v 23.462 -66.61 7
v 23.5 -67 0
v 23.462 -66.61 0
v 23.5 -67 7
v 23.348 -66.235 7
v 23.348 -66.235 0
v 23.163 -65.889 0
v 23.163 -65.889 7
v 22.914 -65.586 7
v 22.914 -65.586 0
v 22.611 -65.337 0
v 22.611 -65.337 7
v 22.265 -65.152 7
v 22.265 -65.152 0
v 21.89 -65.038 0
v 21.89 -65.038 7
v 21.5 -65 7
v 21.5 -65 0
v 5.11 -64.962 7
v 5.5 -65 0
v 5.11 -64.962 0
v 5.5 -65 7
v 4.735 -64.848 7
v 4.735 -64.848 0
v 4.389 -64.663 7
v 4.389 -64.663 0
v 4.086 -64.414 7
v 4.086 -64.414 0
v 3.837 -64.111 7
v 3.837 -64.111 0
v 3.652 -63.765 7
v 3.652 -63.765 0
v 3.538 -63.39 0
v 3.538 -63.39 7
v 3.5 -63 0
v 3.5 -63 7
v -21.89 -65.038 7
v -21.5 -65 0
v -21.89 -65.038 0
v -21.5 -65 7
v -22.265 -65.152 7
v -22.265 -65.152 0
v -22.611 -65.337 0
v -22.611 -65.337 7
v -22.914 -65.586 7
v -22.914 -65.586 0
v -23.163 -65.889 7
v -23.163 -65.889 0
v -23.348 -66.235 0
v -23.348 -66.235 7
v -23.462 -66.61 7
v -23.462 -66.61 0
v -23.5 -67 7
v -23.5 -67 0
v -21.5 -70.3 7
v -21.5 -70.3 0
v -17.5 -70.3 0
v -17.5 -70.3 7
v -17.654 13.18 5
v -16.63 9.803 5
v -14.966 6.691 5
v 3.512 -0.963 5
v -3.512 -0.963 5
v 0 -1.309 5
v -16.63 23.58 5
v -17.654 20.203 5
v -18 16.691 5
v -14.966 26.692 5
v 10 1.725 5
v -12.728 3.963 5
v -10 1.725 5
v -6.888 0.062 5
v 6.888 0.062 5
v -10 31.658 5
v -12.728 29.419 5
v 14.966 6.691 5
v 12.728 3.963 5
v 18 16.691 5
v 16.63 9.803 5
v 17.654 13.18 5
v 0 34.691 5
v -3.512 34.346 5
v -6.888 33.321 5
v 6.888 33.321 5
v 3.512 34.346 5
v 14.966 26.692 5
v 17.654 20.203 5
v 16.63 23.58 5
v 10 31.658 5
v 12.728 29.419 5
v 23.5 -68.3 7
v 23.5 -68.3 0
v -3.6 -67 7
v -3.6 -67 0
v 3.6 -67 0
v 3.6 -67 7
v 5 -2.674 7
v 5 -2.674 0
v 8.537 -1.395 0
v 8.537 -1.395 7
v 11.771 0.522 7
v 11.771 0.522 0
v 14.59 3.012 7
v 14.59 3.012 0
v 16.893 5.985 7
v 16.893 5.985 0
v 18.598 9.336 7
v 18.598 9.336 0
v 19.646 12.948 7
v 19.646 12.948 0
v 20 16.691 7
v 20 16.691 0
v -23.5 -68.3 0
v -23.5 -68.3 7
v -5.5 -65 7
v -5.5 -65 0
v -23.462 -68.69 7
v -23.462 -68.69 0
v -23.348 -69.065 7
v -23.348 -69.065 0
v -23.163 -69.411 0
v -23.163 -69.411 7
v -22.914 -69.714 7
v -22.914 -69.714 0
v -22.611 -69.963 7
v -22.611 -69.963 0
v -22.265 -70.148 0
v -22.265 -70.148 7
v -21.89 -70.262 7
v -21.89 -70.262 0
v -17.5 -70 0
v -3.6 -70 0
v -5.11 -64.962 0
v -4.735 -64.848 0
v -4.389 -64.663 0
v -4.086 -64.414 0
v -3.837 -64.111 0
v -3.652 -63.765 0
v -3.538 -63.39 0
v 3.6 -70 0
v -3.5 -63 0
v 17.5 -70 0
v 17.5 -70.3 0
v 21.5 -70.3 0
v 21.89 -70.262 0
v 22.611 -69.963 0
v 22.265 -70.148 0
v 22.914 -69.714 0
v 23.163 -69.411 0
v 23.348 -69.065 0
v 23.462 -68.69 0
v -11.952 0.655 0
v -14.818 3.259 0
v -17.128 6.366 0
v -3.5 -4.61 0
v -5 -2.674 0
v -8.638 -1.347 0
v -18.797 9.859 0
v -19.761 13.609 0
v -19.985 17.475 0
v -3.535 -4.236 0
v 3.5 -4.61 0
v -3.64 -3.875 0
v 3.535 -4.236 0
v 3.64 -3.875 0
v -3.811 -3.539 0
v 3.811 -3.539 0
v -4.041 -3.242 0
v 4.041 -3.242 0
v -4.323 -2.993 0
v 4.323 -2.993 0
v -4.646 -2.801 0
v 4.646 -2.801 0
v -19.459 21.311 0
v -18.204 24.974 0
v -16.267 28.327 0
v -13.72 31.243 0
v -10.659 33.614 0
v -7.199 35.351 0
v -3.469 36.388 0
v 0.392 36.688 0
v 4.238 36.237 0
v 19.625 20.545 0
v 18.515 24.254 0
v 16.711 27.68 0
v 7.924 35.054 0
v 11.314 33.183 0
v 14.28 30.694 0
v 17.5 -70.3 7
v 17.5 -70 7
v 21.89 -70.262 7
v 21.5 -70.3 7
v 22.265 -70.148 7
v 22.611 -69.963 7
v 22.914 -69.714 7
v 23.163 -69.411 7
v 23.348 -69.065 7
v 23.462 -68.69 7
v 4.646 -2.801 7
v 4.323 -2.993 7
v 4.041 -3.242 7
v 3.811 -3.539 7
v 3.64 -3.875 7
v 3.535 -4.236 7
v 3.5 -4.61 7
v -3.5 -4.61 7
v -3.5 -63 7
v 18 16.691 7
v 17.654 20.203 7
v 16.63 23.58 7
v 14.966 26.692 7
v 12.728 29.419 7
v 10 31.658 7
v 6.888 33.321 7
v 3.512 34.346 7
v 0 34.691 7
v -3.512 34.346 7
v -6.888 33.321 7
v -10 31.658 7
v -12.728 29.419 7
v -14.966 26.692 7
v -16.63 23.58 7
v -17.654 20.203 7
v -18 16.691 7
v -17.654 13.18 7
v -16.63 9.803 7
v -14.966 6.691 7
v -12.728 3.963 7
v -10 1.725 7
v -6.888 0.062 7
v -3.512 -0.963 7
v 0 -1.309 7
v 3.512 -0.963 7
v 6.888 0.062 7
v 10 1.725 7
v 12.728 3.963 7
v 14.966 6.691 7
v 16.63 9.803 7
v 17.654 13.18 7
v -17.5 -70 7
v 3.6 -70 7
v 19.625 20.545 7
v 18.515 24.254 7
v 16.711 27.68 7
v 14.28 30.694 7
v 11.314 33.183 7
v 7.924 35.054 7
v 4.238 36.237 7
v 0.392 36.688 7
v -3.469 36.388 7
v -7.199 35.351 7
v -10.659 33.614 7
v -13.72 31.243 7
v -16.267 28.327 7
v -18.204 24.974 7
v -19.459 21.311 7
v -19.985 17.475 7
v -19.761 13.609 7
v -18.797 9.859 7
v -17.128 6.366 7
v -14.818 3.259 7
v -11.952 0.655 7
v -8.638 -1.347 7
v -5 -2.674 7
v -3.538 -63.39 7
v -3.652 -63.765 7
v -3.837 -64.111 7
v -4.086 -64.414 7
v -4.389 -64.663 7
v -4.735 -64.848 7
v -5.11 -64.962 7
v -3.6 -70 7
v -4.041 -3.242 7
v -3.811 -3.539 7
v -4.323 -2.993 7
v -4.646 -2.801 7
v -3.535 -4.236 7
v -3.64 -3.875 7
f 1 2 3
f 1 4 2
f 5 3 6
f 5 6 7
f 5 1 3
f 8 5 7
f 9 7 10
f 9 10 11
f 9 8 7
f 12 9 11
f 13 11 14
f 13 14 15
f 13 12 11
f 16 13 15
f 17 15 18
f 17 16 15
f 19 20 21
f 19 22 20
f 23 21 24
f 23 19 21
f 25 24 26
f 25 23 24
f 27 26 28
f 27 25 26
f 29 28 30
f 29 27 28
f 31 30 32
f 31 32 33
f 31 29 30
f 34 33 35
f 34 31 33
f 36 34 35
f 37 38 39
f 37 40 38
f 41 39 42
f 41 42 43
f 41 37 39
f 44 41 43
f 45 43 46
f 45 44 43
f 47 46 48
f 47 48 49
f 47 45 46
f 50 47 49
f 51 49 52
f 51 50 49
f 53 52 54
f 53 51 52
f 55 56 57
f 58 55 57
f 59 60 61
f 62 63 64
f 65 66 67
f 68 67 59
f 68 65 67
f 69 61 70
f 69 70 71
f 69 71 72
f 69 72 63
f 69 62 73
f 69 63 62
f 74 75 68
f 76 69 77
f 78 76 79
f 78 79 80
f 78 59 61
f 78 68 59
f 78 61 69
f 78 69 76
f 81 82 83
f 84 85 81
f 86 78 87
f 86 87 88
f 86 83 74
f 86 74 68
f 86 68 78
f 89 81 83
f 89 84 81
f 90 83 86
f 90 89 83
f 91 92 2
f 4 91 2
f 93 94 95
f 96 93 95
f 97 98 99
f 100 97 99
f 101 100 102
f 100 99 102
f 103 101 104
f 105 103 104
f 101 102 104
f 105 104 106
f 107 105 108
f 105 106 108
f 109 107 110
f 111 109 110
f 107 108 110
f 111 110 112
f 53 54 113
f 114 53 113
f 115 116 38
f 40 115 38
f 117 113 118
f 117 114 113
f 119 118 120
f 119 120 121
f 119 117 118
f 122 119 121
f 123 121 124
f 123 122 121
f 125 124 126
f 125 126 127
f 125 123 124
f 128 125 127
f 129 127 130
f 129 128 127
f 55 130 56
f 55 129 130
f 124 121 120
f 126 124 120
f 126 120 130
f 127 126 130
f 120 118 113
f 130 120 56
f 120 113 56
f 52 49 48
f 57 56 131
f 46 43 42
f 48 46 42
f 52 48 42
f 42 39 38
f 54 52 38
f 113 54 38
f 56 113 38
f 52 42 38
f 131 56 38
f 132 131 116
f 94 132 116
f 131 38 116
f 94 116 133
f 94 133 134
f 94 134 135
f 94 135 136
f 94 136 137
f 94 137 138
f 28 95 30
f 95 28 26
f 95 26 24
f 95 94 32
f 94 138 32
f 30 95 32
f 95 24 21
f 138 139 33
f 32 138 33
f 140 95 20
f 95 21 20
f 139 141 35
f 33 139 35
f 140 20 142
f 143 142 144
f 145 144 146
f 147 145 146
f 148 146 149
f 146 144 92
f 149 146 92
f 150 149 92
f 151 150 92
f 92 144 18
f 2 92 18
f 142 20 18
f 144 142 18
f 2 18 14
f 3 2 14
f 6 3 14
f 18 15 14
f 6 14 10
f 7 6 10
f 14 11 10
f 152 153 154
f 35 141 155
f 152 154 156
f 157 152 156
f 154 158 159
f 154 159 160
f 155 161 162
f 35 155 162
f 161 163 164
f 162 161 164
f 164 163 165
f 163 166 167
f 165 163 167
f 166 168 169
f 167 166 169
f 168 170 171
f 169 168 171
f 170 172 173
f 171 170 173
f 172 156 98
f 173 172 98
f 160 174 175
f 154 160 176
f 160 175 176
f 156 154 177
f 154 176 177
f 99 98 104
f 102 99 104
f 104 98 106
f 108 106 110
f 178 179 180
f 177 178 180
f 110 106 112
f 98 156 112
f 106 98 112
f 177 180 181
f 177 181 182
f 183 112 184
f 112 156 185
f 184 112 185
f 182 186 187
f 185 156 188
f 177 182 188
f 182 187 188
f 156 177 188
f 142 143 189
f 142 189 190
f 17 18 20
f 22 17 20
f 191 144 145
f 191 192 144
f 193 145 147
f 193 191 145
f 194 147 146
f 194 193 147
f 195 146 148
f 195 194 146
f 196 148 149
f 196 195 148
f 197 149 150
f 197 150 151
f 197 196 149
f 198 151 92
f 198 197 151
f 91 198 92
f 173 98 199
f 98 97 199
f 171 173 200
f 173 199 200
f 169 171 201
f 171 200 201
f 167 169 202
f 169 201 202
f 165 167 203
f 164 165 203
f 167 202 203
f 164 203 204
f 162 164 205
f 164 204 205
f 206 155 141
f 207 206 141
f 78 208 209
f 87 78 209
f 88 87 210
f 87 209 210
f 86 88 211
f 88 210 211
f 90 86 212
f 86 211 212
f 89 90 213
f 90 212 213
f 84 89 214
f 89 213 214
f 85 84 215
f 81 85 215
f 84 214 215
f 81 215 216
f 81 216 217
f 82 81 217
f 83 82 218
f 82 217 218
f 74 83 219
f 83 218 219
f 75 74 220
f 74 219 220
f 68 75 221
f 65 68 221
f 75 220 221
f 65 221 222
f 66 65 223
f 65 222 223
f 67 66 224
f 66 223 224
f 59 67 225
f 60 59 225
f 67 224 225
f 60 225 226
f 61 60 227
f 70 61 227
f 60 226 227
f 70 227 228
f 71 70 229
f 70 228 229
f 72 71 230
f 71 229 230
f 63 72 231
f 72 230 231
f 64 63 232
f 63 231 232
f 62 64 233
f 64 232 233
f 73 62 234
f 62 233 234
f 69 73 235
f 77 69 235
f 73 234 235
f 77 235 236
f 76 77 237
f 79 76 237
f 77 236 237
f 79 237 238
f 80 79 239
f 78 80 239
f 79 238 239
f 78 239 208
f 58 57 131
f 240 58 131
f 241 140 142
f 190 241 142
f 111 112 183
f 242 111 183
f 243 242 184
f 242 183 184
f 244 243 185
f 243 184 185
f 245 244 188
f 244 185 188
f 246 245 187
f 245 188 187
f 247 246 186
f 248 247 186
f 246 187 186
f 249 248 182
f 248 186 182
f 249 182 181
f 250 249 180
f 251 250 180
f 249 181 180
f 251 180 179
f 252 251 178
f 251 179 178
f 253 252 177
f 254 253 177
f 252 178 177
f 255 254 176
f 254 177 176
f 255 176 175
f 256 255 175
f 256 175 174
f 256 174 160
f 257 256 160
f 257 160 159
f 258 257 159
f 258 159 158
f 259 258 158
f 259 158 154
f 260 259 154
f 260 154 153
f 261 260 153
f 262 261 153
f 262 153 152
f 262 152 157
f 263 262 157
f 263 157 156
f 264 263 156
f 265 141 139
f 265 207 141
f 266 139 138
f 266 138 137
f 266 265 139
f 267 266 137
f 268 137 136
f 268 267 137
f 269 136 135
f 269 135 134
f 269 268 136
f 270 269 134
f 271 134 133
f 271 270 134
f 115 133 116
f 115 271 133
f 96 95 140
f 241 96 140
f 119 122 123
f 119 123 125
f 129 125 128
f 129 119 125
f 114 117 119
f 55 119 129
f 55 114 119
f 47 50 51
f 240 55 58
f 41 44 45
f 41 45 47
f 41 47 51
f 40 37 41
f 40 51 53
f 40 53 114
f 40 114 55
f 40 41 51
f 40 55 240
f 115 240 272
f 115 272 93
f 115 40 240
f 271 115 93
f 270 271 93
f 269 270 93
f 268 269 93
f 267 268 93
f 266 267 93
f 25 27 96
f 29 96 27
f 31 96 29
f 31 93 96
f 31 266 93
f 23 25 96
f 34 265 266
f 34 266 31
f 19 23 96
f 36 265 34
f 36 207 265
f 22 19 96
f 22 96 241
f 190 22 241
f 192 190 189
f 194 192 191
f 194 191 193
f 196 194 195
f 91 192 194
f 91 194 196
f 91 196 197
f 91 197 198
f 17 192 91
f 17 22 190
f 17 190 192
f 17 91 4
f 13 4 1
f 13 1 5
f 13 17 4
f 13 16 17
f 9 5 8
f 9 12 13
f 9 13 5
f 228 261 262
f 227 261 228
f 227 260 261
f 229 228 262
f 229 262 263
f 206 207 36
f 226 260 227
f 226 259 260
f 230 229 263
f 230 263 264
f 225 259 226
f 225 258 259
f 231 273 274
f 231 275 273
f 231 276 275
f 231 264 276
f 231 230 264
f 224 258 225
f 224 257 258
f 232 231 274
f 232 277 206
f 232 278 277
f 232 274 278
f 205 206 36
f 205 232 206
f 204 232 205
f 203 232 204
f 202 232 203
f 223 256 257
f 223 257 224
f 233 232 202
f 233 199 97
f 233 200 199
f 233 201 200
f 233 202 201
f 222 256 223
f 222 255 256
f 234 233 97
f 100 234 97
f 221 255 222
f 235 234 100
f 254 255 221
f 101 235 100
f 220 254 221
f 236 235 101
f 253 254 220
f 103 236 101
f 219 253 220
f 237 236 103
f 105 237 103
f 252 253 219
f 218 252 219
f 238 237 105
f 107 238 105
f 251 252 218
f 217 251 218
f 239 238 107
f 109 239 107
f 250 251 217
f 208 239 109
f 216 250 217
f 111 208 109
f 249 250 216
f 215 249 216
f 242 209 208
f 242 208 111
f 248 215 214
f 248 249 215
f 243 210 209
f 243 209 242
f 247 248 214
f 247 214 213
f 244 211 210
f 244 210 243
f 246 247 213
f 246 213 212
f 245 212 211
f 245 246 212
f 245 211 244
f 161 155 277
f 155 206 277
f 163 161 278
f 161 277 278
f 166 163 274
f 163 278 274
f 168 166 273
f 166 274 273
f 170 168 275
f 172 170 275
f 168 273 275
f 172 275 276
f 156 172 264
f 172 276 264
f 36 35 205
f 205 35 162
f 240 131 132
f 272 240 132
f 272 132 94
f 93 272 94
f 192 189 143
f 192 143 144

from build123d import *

# Parameters (mm, degrees)
F0_W     = 6
F0_H     = 0.3
F1_DEPTH = 7
F2_R     = 18
F3_DEPTH = 2
F4_R     = 2


# Not quite as in the source:
# - a feature names something its author has since deleted; it is built from what else it names


with BuildPart() as f1:
    # F0 (on Top) → F1 (new body)
    with BuildSketch(Plane.XY):
        with BuildLine():
            ThreePointArc((3.5, -3), (0, -3.3086313325), (-3.5, -3))
            Line((-3.5, -3), (-3.5, -65))
            Line((-3.5, -65), (-23.5, -65))
            Line((-23.5, -65), (-23.5, -70))
            Line((-23.5, -70), (-17.5, -70))
            Line((-17.5, -70), (-3.6, -70))
            Line((-3.6, -70), (-3.6, -67))
            Line((-3.6, -67), (3.6, -67))
            Line((3.6, -67), (3.6, -70))
            Line((3.6, -70), (17.5, -70))
            Line((17.5, -70), (23.5, -70))
            Line((23.5, -70), (23.5, -65))
            Line((23.5, -65), (3.5, -65))
            Line((3.5, -65), (3.5, -3))
        make_face()
        with BuildLine():
            ThreePointArc((20, 16.6913686675), (-12.8452325787, 32.0210783843), (-3.5, -3))
            ThreePointArc((-3.5, -3), (0, -3.3086313325), (3.5, -3))
            ThreePointArc((3.5, -3), (15.3297097168, 3.8461360889), (20, 16.6913686675))
        make_face()
        with Locations((-20.5, -70.15)):
            Rectangle(F0_W, F0_H)
        with Locations((20.5, -70.15)):
            Rectangle(F0_W, F0_H)
    extrude(amount=F1_DEPTH)

    # F2 (on face) → F3 (cut)
    with BuildSketch(Plane.XY.offset(7)):
        with Locations((0, 16.6913686675)):
            Circle(F2_R)
    extrude(amount=-F3_DEPTH, mode=Mode.SUBTRACT)

    # F4
    f4_edges = [f1.edges().sort_by_distance(p)[0] for p in [
        (-3.5, -3, 3.5),
        (3.5, -3, 3.5),
        (23.5, -65, 3.5),
        (-23.5, -65, 3.5),
        (-3.5, -65, 3.5),
        (3.5, -65, 3.5),
        (-23.5, -70.3, 3.5),
        (23.5, -70.3, 3.5),
    ]]
    fillet(f4_edges, radius=F4_R)


solid = f1.part
